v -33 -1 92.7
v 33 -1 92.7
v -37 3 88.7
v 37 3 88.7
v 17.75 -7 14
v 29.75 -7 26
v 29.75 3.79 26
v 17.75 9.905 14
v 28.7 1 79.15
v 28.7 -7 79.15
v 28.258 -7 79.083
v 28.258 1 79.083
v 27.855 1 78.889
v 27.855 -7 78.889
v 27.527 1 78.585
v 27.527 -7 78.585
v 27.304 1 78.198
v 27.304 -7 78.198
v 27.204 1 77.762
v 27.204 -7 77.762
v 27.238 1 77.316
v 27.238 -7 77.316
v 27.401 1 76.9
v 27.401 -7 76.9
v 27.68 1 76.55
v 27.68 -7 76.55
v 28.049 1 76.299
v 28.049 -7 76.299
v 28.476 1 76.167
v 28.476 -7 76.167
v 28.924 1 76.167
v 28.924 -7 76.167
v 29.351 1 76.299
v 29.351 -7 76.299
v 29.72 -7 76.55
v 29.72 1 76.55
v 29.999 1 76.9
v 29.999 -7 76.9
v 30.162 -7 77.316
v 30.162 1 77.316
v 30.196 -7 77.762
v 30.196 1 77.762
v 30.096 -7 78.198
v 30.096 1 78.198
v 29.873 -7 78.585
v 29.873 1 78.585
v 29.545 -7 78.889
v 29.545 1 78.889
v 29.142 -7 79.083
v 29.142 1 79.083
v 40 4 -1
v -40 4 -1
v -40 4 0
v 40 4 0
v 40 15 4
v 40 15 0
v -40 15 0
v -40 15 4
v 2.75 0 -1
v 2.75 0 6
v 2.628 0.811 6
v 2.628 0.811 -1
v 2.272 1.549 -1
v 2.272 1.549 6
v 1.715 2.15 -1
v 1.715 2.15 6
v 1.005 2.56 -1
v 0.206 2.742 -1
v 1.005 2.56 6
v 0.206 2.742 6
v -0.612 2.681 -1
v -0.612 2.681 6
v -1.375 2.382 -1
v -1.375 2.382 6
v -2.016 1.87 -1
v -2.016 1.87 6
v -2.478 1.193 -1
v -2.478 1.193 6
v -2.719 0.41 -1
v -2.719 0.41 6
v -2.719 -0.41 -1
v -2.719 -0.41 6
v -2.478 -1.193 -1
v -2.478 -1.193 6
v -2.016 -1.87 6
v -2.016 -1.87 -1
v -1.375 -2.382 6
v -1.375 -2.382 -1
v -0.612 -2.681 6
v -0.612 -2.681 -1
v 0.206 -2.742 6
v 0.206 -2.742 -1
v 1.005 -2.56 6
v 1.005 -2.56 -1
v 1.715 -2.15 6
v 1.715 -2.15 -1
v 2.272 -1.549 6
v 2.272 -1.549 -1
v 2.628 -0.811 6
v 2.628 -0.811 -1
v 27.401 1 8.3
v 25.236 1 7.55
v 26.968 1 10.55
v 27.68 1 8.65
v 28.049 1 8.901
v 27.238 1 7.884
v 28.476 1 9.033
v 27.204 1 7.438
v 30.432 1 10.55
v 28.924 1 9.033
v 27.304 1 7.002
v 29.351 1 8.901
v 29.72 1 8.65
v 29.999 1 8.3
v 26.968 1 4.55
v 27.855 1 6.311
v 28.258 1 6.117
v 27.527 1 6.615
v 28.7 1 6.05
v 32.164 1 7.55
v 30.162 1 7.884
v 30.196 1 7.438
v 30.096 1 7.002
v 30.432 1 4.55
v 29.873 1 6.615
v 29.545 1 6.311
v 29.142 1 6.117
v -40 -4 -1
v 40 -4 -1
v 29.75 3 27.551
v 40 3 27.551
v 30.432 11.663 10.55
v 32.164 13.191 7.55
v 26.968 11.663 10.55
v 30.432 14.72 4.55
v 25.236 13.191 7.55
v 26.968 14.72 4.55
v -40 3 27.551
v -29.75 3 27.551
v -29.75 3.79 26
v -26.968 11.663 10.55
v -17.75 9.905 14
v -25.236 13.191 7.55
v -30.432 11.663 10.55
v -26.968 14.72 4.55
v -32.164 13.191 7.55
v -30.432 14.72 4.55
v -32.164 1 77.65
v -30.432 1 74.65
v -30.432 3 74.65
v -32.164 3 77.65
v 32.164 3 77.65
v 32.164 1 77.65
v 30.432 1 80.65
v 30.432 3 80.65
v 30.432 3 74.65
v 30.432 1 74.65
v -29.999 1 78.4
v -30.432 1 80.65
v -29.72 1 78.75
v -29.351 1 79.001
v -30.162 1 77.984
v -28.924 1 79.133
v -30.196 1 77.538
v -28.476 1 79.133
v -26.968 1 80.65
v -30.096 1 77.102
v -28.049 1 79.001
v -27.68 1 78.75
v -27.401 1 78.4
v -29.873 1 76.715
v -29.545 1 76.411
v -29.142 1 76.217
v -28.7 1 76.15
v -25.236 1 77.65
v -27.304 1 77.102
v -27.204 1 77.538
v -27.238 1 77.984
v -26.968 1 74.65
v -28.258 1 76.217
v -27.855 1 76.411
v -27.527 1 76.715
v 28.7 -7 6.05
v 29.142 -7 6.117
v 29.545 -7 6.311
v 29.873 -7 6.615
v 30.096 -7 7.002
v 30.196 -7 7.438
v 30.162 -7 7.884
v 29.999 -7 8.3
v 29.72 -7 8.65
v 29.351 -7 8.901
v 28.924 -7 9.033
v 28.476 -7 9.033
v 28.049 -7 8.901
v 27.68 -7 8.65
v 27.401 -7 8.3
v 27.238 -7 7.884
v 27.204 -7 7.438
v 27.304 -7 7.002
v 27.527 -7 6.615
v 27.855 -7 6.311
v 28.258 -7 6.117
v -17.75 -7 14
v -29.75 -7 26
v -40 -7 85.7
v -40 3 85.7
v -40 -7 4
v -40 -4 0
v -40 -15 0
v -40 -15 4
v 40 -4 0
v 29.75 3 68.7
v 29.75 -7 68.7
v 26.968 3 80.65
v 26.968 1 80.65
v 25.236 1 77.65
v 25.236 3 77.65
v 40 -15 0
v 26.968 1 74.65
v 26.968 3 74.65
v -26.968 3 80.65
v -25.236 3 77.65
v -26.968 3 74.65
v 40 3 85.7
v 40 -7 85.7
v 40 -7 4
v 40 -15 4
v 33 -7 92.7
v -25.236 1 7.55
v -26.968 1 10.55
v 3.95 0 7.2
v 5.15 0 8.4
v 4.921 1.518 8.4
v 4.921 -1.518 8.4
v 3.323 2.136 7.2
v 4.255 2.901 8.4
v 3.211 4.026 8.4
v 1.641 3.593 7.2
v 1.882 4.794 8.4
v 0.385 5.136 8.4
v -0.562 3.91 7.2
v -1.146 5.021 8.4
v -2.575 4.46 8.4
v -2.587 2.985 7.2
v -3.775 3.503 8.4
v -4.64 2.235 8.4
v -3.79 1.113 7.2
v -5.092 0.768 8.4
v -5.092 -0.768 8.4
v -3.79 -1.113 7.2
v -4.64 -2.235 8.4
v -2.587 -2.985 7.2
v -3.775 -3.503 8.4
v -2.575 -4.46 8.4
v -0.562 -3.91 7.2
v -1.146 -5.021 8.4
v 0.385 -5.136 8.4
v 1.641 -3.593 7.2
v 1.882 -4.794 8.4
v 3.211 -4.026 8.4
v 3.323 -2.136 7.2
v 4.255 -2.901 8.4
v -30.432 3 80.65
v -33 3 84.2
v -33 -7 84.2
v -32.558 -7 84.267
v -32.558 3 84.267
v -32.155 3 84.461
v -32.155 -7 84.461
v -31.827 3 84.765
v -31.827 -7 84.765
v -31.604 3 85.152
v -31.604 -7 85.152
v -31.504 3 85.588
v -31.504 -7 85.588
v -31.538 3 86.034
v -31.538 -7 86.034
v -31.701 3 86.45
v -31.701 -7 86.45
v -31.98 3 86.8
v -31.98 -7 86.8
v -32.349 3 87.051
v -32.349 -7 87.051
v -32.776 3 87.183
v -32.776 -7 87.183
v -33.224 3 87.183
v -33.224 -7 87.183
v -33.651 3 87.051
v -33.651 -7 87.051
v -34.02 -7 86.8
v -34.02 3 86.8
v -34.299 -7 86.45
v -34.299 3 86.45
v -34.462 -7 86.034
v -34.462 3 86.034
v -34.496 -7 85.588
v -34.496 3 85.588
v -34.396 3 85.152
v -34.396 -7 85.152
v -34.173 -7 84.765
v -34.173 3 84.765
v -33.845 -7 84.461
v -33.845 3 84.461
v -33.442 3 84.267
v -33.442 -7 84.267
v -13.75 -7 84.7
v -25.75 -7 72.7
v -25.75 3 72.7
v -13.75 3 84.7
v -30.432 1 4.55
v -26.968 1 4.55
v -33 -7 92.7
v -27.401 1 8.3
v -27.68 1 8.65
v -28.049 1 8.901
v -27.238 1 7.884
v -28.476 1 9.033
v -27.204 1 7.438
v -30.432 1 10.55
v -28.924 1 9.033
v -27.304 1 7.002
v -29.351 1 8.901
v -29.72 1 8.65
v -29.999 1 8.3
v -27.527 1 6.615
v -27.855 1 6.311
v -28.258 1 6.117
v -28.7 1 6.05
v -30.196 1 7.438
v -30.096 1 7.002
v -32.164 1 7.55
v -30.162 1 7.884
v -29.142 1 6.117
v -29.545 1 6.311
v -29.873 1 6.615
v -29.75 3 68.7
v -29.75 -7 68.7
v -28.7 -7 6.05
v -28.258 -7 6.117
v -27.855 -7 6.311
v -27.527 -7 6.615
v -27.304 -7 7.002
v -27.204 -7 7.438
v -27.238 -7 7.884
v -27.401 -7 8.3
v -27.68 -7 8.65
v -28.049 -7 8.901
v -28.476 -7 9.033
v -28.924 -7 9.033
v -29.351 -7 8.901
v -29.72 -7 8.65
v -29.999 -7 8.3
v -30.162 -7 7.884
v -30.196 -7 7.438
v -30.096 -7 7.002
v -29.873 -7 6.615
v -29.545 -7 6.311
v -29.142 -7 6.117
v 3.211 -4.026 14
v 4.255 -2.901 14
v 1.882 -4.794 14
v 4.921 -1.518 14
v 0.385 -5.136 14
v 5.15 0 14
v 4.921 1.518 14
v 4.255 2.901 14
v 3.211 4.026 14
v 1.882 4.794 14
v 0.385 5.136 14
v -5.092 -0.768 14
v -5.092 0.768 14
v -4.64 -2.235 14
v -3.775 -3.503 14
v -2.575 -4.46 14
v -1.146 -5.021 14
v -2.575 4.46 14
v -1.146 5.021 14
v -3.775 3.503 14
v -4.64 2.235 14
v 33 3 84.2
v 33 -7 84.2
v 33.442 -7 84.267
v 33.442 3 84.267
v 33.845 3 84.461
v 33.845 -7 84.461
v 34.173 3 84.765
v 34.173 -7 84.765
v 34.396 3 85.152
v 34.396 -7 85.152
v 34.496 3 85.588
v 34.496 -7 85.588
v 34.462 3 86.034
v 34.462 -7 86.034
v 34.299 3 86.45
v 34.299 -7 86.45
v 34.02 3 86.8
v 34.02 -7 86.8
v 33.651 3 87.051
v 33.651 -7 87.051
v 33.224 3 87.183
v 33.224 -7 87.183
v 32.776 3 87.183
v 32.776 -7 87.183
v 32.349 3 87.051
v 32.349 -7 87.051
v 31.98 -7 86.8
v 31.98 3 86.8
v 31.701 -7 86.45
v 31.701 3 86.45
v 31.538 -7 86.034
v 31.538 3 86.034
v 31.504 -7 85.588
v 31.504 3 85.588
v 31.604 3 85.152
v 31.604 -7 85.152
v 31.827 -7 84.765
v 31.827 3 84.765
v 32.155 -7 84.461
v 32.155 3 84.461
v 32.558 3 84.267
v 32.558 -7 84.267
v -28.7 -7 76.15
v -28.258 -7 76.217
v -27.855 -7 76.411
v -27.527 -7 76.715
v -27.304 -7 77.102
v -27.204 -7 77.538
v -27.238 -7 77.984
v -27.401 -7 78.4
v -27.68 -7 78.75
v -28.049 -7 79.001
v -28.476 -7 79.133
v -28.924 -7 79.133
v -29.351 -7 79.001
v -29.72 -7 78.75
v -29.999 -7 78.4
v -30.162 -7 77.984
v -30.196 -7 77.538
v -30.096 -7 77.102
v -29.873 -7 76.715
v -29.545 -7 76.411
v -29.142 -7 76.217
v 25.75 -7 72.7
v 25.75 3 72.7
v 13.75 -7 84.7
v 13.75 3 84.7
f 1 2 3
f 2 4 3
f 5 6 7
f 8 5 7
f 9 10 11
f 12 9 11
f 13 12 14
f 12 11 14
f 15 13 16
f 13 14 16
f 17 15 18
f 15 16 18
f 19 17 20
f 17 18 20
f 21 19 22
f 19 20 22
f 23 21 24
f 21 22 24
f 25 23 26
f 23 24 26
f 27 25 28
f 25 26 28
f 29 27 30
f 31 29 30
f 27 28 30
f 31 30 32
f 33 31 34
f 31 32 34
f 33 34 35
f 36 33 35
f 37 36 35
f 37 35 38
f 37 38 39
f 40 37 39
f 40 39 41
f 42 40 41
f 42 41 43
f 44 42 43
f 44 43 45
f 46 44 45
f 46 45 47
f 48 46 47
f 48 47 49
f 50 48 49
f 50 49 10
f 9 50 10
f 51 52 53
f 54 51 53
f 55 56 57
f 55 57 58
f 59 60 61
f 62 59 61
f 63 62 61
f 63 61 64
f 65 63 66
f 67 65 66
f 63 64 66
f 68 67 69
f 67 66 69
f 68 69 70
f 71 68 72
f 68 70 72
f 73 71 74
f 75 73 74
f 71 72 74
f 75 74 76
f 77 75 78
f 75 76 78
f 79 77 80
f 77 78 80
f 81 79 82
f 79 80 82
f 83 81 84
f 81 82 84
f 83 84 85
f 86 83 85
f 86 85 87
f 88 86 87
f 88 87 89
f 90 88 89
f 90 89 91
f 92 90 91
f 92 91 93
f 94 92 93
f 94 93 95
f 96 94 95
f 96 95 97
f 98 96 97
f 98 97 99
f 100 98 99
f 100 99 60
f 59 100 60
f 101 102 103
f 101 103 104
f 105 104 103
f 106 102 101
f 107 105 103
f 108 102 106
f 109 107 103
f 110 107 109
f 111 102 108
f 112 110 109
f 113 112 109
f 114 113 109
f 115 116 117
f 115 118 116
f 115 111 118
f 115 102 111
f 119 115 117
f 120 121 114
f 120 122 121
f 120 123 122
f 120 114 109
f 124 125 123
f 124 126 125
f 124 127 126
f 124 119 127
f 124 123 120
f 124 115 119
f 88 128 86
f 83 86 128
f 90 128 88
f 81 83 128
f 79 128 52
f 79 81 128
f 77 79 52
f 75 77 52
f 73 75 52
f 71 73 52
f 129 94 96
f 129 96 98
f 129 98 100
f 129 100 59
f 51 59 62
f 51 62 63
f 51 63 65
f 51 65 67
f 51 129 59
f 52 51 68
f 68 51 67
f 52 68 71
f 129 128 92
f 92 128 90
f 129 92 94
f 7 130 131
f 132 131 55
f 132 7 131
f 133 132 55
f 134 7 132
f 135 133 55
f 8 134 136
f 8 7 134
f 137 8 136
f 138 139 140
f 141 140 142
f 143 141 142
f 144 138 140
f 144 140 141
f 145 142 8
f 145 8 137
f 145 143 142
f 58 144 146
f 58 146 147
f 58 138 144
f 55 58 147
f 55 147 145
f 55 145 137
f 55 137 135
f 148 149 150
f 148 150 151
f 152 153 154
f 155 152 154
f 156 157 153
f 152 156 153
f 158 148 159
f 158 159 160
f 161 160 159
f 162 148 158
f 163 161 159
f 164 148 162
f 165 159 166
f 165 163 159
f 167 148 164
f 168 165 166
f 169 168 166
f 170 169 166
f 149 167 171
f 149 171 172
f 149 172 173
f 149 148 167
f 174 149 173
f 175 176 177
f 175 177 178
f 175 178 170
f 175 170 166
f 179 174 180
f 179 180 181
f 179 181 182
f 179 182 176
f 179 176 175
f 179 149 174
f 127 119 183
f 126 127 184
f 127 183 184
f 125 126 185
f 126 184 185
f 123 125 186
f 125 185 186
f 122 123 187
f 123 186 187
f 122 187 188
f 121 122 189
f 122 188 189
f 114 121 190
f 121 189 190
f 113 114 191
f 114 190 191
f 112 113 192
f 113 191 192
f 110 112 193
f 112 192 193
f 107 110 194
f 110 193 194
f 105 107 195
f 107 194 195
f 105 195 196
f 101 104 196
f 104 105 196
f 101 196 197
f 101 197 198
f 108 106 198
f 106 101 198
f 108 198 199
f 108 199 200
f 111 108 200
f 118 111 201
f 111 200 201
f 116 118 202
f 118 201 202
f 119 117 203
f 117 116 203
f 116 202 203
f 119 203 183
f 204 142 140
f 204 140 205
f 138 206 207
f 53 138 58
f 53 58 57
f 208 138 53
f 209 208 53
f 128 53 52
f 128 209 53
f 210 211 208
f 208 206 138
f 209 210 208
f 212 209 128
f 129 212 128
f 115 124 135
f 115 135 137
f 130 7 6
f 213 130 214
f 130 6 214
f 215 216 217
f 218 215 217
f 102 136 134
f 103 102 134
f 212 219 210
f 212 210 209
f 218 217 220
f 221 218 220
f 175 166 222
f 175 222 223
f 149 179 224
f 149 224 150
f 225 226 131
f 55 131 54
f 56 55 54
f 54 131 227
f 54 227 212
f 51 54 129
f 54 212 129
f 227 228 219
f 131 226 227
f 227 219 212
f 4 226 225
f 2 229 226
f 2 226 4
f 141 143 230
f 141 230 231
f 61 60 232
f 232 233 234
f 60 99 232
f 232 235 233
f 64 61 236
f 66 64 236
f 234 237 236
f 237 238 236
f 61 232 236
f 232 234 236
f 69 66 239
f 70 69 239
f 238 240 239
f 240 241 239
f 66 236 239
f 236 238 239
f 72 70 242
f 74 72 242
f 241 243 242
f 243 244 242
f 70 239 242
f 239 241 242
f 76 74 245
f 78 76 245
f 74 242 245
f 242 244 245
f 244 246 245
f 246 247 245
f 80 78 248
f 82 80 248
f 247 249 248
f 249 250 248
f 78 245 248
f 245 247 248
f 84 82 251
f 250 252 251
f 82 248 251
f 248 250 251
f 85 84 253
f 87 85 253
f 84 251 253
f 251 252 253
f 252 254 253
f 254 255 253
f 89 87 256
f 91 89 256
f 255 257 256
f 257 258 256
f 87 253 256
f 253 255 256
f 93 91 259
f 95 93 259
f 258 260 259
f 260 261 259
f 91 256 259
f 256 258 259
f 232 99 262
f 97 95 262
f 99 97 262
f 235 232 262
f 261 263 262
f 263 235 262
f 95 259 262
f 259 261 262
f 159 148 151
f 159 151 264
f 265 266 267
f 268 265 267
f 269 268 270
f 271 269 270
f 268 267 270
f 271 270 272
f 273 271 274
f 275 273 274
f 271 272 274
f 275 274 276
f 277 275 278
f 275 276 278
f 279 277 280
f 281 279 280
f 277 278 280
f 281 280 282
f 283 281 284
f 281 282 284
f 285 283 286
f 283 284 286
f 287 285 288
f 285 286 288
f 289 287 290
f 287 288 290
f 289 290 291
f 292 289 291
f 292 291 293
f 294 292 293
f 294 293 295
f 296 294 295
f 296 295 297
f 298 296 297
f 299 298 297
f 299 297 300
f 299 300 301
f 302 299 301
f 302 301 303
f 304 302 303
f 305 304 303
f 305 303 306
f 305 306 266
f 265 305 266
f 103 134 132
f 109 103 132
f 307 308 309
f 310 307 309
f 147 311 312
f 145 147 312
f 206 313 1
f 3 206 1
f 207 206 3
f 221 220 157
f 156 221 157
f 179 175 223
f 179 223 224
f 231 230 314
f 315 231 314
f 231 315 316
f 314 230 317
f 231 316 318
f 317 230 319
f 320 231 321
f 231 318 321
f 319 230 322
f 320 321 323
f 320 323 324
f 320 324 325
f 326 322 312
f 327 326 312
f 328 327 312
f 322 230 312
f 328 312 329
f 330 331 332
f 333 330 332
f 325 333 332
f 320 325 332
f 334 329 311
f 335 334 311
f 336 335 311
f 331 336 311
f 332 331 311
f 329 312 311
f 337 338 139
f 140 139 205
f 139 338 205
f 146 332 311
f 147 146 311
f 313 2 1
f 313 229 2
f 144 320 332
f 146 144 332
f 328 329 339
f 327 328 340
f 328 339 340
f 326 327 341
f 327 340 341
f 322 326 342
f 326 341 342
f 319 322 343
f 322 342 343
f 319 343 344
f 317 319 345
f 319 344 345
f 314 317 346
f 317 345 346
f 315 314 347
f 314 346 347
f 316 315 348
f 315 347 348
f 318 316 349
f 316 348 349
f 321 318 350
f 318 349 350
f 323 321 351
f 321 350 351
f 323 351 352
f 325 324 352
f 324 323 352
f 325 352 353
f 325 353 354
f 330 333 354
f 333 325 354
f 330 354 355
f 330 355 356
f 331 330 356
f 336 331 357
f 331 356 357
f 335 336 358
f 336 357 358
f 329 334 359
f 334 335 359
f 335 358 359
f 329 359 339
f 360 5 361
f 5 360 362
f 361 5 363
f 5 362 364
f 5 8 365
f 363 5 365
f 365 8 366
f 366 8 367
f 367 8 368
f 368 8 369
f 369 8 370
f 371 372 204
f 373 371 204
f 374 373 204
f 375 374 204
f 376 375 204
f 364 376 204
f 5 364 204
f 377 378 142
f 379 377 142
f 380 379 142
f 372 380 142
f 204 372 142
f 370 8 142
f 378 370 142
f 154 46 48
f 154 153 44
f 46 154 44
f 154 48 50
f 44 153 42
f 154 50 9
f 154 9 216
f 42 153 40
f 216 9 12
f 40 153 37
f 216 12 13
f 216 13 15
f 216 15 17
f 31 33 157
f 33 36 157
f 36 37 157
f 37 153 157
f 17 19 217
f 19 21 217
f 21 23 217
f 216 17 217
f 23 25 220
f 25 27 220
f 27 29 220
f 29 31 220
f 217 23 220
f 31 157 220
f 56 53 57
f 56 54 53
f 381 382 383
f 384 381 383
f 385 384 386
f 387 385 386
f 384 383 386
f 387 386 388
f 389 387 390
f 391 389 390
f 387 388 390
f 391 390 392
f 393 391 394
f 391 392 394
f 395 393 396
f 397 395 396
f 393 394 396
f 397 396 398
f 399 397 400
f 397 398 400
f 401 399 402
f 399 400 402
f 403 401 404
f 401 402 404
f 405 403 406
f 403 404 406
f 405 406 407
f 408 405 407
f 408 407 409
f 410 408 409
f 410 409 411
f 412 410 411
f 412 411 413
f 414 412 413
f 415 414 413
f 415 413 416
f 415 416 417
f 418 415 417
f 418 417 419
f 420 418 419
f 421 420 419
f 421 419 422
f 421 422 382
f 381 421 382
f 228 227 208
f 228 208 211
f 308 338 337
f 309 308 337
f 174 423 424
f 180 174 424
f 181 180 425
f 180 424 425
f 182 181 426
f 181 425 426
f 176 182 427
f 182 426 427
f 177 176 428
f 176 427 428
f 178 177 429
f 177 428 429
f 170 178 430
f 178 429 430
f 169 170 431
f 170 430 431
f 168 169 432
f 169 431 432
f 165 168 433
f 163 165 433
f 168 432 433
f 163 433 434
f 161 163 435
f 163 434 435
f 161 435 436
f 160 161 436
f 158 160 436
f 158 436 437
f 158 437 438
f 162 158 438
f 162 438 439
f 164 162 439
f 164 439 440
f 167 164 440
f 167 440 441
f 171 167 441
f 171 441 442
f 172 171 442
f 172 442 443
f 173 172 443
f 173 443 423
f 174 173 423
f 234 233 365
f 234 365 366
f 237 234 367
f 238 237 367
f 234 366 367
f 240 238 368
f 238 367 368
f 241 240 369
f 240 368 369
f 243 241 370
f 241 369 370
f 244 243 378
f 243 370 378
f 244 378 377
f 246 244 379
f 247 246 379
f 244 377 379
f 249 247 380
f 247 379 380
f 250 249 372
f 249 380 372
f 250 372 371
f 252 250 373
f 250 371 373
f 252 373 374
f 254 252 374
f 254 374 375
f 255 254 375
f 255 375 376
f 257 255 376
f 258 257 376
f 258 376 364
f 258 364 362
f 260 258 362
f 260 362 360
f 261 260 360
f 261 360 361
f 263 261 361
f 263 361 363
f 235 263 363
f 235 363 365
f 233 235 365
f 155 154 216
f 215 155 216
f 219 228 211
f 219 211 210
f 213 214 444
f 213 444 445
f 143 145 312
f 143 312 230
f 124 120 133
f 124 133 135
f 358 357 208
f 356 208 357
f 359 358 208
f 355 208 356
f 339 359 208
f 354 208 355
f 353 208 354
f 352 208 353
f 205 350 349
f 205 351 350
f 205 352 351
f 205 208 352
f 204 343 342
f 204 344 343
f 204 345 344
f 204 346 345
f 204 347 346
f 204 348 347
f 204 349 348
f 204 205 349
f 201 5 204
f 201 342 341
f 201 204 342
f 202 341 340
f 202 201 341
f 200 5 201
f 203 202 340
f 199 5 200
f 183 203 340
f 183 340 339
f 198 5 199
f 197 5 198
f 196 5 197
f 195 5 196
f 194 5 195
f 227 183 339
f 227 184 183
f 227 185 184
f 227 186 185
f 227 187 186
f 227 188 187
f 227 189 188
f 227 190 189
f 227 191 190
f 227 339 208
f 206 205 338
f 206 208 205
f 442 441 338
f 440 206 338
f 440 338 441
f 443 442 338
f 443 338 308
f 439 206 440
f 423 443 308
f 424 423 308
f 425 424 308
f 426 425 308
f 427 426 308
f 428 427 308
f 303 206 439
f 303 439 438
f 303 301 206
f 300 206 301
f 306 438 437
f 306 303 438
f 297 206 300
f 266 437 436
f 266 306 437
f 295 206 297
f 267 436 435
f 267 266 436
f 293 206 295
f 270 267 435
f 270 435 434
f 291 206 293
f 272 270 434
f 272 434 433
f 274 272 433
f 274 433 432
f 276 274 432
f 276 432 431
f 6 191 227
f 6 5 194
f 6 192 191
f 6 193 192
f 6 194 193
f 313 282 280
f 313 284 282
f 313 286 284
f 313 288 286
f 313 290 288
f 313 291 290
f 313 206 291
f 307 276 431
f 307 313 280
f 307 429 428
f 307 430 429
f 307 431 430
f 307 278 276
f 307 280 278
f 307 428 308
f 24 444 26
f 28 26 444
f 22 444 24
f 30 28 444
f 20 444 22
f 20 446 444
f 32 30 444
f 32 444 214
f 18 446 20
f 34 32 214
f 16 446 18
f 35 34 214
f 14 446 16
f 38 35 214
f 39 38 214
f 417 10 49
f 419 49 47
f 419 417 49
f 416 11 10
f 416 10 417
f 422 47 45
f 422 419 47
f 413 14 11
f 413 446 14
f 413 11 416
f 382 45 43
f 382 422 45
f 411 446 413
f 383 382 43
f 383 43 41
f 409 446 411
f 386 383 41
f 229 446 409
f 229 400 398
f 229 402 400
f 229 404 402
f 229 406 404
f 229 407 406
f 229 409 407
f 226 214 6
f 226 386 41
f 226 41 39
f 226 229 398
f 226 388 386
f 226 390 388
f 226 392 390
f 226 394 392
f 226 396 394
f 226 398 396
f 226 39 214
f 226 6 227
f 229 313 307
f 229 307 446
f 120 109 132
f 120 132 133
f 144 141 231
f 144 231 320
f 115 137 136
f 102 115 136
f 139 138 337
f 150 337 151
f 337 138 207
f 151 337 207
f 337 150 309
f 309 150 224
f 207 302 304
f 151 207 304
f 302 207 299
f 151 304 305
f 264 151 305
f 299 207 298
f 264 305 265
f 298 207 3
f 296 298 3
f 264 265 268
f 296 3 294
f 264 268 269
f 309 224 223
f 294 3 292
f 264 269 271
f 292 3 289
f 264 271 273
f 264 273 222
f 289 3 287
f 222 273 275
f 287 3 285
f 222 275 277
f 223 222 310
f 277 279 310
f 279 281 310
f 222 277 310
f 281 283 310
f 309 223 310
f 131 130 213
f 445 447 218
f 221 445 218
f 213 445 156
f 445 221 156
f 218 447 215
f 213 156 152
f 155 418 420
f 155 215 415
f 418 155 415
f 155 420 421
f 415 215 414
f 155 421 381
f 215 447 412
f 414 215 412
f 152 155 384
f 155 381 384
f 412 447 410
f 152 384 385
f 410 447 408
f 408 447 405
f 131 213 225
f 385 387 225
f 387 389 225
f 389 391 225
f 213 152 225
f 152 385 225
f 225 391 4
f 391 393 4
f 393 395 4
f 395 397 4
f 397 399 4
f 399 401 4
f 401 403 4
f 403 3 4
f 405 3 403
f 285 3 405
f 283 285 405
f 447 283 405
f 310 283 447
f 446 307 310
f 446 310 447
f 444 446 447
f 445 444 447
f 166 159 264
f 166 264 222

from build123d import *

# Parameters (mm, degrees)
BOSS_EXTRUDE1_DEPTH     = 40
SKETCH2_W               = 10
SKETCH2_H               = 10
BOSS_EXTRUDE2_DEPTH     = 80
SKETCH3_R               = 1.5
CUT_EXTRUDE1_DEPTH      = 48.749345545
SKETCH4_R               = 1.5
BOSS_EXTRUDE3_DEPTH     = 10
CHAMFER1_SIZE           = 23.551326066
CHAMFER1_SIZE_2         = 12
CHAMFER2_SIZE           = 4
CHAMFER3_SIZE           = 4
CHAMFER4_SIZE           = 12
SKETCH7_R               = 1.5
CUT_EXTRUDE3_DEPTH      = 104.330973091
CUT_EXTRUDE2_DEPTH      = 103.553839519
CUT_EXTRUDE2_DEPTH_BACK = 2
CHAMFER5_SIZE           = 7
SKETCH8_R               = 5.15
CUT_EXTRUDE4_DEPTH      = 5.5
SKETCH9_R               = 2.75
CUT_EXTRUDE5_DEPTH      = 95.417371283
CHAMFER6_SIZE           = 2.5


# Some blends are built 0.0001 mm under size
with BuildPart() as part:
    # Sketch1 → Boss-Extrude1 (new, symmetric)
    with BuildSketch(Plane(origin=(0, 0, 0), x_dir=(0, 0, -1), z_dir=(1, 0, 0))):
        Polygon((0, 4), (0, 15), (-4, 15), (-4, -15), (0, -15), (0, -4), (1, -4), (1, 4), align=None)
    extrude(amount=BOSS_EXTRUDE1_DEPTH, both=True)

    # Sketch2 → Boss-Extrude2 (add)
    with BuildSketch(Plane.ZY.offset(40)):
        with Locations((9, -2)):
            Rectangle(SKETCH2_W, SKETCH2_H)
    extrude(amount=-BOSS_EXTRUDE2_DEPTH)

    # Sketch3 → Cut-Extrude1 (cut, through all)
    with BuildSketch(Plane.XZ.offset(7)):
        with Locations(Location((-28.7, 7.55, 0), (0, 0, 270))):
            Circle(SKETCH3_R)
        with Locations(Location((28.7, 7.55, 0), (0, 0, 270))):
            Circle(SKETCH3_R)
    extrude(amount=-CUT_EXTRUDE1_DEPTH, mode=Mode.SUBTRACT)

    # Sketch4 → Boss-Extrude3 (add)
    with BuildSketch(Plane.XZ.offset(7)):
        Polygon((-40, 14), (-29.75, 14), (-29.75, 72.7), (-25.75, 72.7), (-25.75, 84.7), (25.75, 84.7), (25.75, 72.7), (29.75, 72.7), (29.75, 14), (40, 14), (40, 92.7), (-40, 92.7), align=None)
        with Locations(Location((-28.7, 77.65, 0), (0, 0, 270))):
            Circle(SKETCH4_R, mode=Mode.SUBTRACT)
        with Locations(Location((28.7, 77.65, 0), (0, 0, 90))):
            Circle(SKETCH4_R, mode=Mode.SUBTRACT)
    extrude(amount=-BOSS_EXTRUDE3_DEPTH)

    # Chamfer1
    # the kernel refuses this chamfer: 23.551326066, 12 mm, written as the material it adds along each edge
    with BuildSketch(Plane(origin=(-40, 3, 4), x_dir=(0, -0.017531984409911095, 0.9998463029499337), z_dir=(1, 0, 0))) as chamfer1_piece_1_section:
        Polygon((CHAMFER1_SIZE * 0.999846302953, -CHAMFER1_SIZE * 0.01753198441), (-CHAMFER1_SIZE_2 * 0.0175319844099, -CHAMFER1_SIZE_2 * 0.99984630295), (0, 0), align=None)
    chamfer1_piece_1 = extrude(amount=80, mode=Mode.PRIVATE)
    chamfer1_piece_1 = split(chamfer1_piece_1, bisect_by=Plane(origin=(-34.875, 4.887878827, 14), z_dir=(0, 0, 1)), keep=Keep.TOP, mode=Mode.PRIVATE)
    chamfer1_piece_1 = split(chamfer1_piece_1, bisect_by=Plane(origin=(-29.75, 4.887878827, 19.058840597), z_dir=(-1, 0, 0)), keep=Keep.TOP, mode=Mode.PRIVATE)
    add(chamfer1_piece_1)
    with BuildSketch(Plane(origin=(-40, 3, 4), x_dir=(0, -0.017531984409911095, 0.9998463029499337), z_dir=(1, 0, 0))) as chamfer1_piece_2_section:
        Polygon((CHAMFER1_SIZE * 0.999846302953, -CHAMFER1_SIZE * 0.01753198441), (-CHAMFER1_SIZE_2 * 0.0175319844099, -CHAMFER1_SIZE_2 * 0.99984630295), (0, 0), align=None)
    chamfer1_piece_2 = extrude(amount=80, mode=Mode.PRIVATE)
    chamfer1_piece_2 = split(chamfer1_piece_2, bisect_by=Plane(origin=(-34.907327213, 7.791187199, 14), z_dir=(0, 0, -1)), keep=Keep.TOP, mode=Mode.PRIVATE)
    chamfer1_piece_2 = split(chamfer1_piece_2, bisect_by=Plane(origin=(-29.75, 7.791187199, 8.24071688), z_dir=(-1, 0, 0)), keep=Keep.TOP, mode=Mode.PRIVATE)
    chamfer1_piece_2 = chamfer1_piece_2 - Plane(origin=(-28.7, 7.791187199, 7.55), x_dir=(0, 0, -1), z_dir=(0, -1, 0)) * Cylinder(1.5, 255, mode=Mode.PRIVATE)
    chamfer1_piece_2 = split(chamfer1_piece_2, bisect_by=Plane(origin=(-34.907327213, 15, 8.24071688), z_dir=(0, -1, 0)), keep=Keep.TOP, mode=Mode.PRIVATE)
    add(chamfer1_piece_2)
    with BuildSketch(Plane(origin=(-40, 3, 4), x_dir=(0, -0.017531984409911095, 0.9998463029499337), z_dir=(1, 0, 0))) as chamfer1_piece_3_section:
        Polygon((CHAMFER1_SIZE * 0.999846302953, -CHAMFER1_SIZE * 0.01753198441), (-CHAMFER1_SIZE_2 * 0.0175319844099, -CHAMFER1_SIZE_2 * 0.99984630295), (0, 0), align=None)
    chamfer1_piece_3 = extrude(amount=80, mode=Mode.PRIVATE)
    chamfer1_piece_3 = split(chamfer1_piece_3, bisect_by=Plane(origin=(3.218e-06, 7.789653484, 14), z_dir=(0, 0, -1)), keep=Keep.TOP, mode=Mode.PRIVATE)
    chamfer1_piece_3 = split(chamfer1_piece_3, bisect_by=Plane(origin=(-29.75, 7.789653484, 8.251914963), z_dir=(1, 0, 0)), keep=Keep.TOP, mode=Mode.PRIVATE)
    chamfer1_piece_3 = split(chamfer1_piece_3, bisect_by=Plane(origin=(29.75, 7.789653484, 8.251914963), z_dir=(-1, 0, 0)), keep=Keep.TOP, mode=Mode.PRIVATE)
    chamfer1_piece_3 = chamfer1_piece_3 - Plane(origin=(28.7, 7.789653484, 7.55), x_dir=(0, 0, -1), z_dir=(0, -1, 0)) * Cylinder(1.5, 255, mode=Mode.PRIVATE)
    chamfer1_piece_3 = chamfer1_piece_3 - Plane(origin=(-28.7, 7.789653484, 7.55), x_dir=(0, 0, -1), z_dir=(0, -1, 0)) * Cylinder(1.5, 255, mode=Mode.PRIVATE)
    chamfer1_piece_3 = split(chamfer1_piece_3, bisect_by=Plane(origin=(3.218e-06, 15, 8.251914963), z_dir=(0, -1, 0)), keep=Keep.TOP, mode=Mode.PRIVATE)
    add(chamfer1_piece_3)
    with BuildSketch(Plane(origin=(-40, 3, 4), x_dir=(0, -0.017531984409911095, 0.9998463029499337), z_dir=(1, 0, 0))) as chamfer1_piece_4_section:
        Polygon((CHAMFER1_SIZE * 0.999846302953, -CHAMFER1_SIZE * 0.01753198441), (-CHAMFER1_SIZE_2 * 0.0175319844099, -CHAMFER1_SIZE_2 * 0.99984630295), (0, 0), align=None)
    chamfer1_piece_4 = extrude(amount=80, mode=Mode.PRIVATE)
    chamfer1_piece_4 = split(chamfer1_piece_4, bisect_by=Plane(origin=(34.875, 4.887878827, 14), z_dir=(0, 0, 1)), keep=Keep.TOP, mode=Mode.PRIVATE)
    chamfer1_piece_4 = split(chamfer1_piece_4, bisect_by=Plane(origin=(29.75, 4.887878827, 19.058840597), z_dir=(1, 0, 0)), keep=Keep.TOP, mode=Mode.PRIVATE)
    add(chamfer1_piece_4)
    with BuildSketch(Plane(origin=(-40, 3, 4), x_dir=(0, -0.017531984409911095, 0.9998463029499337), z_dir=(1, 0, 0))) as chamfer1_piece_5_section:
        Polygon((CHAMFER1_SIZE * 0.999846302953, -CHAMFER1_SIZE * 0.01753198441), (-CHAMFER1_SIZE_2 * 0.0175319844099, -CHAMFER1_SIZE_2 * 0.99984630295), (0, 0), align=None)
    chamfer1_piece_5 = extrude(amount=80, mode=Mode.PRIVATE)
    chamfer1_piece_5 = split(chamfer1_piece_5, bisect_by=Plane(origin=(34.907327332, 7.791187313, 14), z_dir=(0, 0, -1)), keep=Keep.TOP, mode=Mode.PRIVATE)
    chamfer1_piece_5 = split(chamfer1_piece_5, bisect_by=Plane(origin=(29.75, 7.791187313, 8.240716948), z_dir=(1, 0, 0)), keep=Keep.TOP, mode=Mode.PRIVATE)
    chamfer1_piece_5 = chamfer1_piece_5 - Plane(origin=(28.7, 7.791187313, 7.55), x_dir=(0, 0, -1), z_dir=(0, -1, 0)) * Cylinder(1.5, 255, mode=Mode.PRIVATE)
    chamfer1_piece_5 = split(chamfer1_piece_5, bisect_by=Plane(origin=(34.907327332, 15, 8.240716948), z_dir=(0, -1, 0)), keep=Keep.TOP, mode=Mode.PRIVATE)
    add(chamfer1_piece_5)

    # Chamfer2
    chamfer2_edges = [part.edges().sort_by_distance(p)[0] for p in [
        (-29.75, -2, 72.7),
        (29.75, -2, 72.7),
    ]]
    chamfer(chamfer2_edges, length=CHAMFER2_SIZE - 0.0001)  # a hair under: the kernel refuses the full size

    # Chamfer3
    chamfer3_edges = [part.edges().sort_by_distance(p)[0] for p in [
        (0, 3, 92.7),
    ]]
    chamfer(chamfer3_edges, length=CHAMFER3_SIZE)

    # Chamfer4
    chamfer4_edges = [part.edges().sort_by_distance(p)[0] for p in [
        (-25.75, -2, 84.7),
        (25.75, -2, 84.7),
        (29.75, 1.452372753, 14),
        (-29.75, 1.452372753, 14),
    ]]
    chamfer(chamfer4_edges, length=CHAMFER4_SIZE - 0.0001)  # a hair under: the kernel refuses the full size

    # Sketch7 → Cut-Extrude3 (cut, through all)
    with BuildSketch(Plane.XZ.offset(7)):
        with Locations(Location((-33, 85.7, 0), (0, 0, 270))):
            Circle(SKETCH7_R)
        with Locations(Location((33, 85.7, 0), (0, 0, 270))):
            Circle(SKETCH7_R)
    extrude(amount=-CUT_EXTRUDE3_DEPTH, mode=Mode.SUBTRACT)

    # Sketch5 → Cut-Extrude2 (cut, two sides: drawn at the far end of the back side and taken through both)
    with BuildSketch(Plane(origin=(0, 3, 0), x_dir=(1, 0, 0), z_dir=(0, 1, 0)).offset(-CUT_EXTRUDE2_DEPTH_BACK)):
        Polygon((32.164101615, -77.65), (30.432050808, -80.65), (26.967949192, -80.65), (25.235898385, -77.65), (26.967949192, -74.65), (30.432050808, -74.65), align=None)
        Polygon((-26.967949192, -74.65), (-30.432050808, -74.65), (-32.164101615, -77.65), (-30.432050808, -80.65), (-26.967949192, -80.65), (-25.235898385, -77.65), align=None)
        Polygon((-25.235898385, -7.55), (-26.967949192, -10.55), (-30.432050808, -10.55), (-32.164101615, -7.55), (-30.432050808, -4.55), (-26.967949192, -4.55), align=None)
        Polygon((26.967949192, -10.55), (30.432050808, -10.55), (32.164101615, -7.55), (30.432050808, -4.55), (26.967949192, -4.55), (25.235898385, -7.55), align=None)
    extrude(amount=CUT_EXTRUDE2_DEPTH + CUT_EXTRUDE2_DEPTH_BACK, mode=Mode.SUBTRACT)

    # Chamfer5
    chamfer5_edges = [part.edges().sort_by_distance(p)[0] for p in [
        (-40, -4, 92.7),
        (40, -4, 92.7),
    ]]
    chamfer(chamfer5_edges, length=CHAMFER5_SIZE)

    # Sketch8 → Cut-Extrude4 (cut)
    with BuildSketch(Plane.XY.offset(14)):
        Circle(SKETCH8_R)
    extrude(amount=-CUT_EXTRUDE4_DEPTH, mode=Mode.SUBTRACT)

    # Sketch9 → Cut-Extrude5 (cut, through all)
    with BuildSketch(Plane.XY.offset(8.5)):
        Circle(SKETCH9_R)
    extrude(amount=-CUT_EXTRUDE5_DEPTH, mode=Mode.SUBTRACT)

    # Chamfer6
    # the kernel refuses this chamfer: 2.5 mm, written as the material it takes off along each edge
    with BuildSketch(Plane(origin=(0, 0, 8.5), x_dir=(1, 0, 0), z_dir=(0, -1, 0))) as chamfer6_piece_1_section:
        Polygon((2.75, -CHAMFER6_SIZE), (2.75 + CHAMFER6_SIZE, 0), (2.75, 0), align=None)
    chamfer6_piece_1 = revolve(axis=Axis((0, 0, 8.5), (0, 0, 1)), mode=Mode.PRIVATE)
    chamfer6_piece_1 = chamfer6_piece_1 & Plane(origin=(0, 0, 7.19466401), x_dir=(1, 0, 0), z_dir=(0, 0, 1)) * Cylinder(5.15, 21, mode=Mode.PRIVATE)
    add(chamfer6_piece_1, mode=Mode.SUBTRACT)


solid = part.part
